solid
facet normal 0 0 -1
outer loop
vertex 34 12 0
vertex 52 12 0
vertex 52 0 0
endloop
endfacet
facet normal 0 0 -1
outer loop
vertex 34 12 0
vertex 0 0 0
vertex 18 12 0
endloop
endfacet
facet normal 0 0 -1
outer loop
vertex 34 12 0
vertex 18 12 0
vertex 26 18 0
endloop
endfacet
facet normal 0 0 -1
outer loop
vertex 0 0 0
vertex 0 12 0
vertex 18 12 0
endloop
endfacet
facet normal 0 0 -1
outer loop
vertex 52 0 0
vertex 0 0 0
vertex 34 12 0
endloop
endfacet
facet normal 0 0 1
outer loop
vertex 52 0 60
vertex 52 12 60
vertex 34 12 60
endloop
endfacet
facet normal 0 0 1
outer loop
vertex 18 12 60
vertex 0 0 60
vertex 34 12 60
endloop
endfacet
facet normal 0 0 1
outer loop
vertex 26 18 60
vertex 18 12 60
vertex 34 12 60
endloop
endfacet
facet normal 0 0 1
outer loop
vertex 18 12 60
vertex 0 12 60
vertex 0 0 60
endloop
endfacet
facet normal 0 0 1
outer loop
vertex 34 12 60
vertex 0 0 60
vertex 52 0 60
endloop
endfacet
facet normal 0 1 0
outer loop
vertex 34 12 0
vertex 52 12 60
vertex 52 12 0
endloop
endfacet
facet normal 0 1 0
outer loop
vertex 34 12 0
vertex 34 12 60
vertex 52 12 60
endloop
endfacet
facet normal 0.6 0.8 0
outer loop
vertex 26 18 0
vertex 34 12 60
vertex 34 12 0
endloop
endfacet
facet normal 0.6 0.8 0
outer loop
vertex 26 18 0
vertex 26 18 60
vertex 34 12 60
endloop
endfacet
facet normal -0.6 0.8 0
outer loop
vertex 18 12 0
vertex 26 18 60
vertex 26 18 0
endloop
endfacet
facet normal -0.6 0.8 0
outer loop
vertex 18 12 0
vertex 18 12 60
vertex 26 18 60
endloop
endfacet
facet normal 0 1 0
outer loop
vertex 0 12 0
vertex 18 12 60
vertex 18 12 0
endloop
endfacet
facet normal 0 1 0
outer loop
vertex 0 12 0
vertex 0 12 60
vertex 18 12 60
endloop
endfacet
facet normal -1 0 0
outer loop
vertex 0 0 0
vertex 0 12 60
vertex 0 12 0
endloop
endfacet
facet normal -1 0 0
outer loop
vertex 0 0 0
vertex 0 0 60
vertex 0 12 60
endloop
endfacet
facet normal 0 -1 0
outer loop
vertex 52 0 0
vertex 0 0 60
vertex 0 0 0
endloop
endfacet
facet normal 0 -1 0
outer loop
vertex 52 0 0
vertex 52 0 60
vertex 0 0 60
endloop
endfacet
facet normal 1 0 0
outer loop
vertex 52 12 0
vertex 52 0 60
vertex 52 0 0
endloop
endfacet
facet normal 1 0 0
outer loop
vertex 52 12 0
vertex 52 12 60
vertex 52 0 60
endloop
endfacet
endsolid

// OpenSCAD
$fn = 32;

// ----------------------------------------------------------------------
// V guide rail: vrib, 52 mm wide
// ----------------------------------------------------------------------

// --- parameters (mm) ---
rail_w = 52;              // rail width, X
base_t = 12;              // base plate thickness
v_depth = 6;              // V feature depth / height
v_half_w = 8;             // half width of the V at the base face
plate_t = 60;             // rail length, Z (the extrusion height)
fit_tol = 0.05;           // declared fit tolerance (prompt contract)
free_tol = 0.2;           // declared free tolerance (prompt contract)

profile = [[0, 0], [52, 0], [52, 12], [34, 12], [26, 18], [18, 12], [0, 12]];  // primary outline, 7 points, counter clockwise

// --- the one profile operation ---
linear_extrude(height = plate_t) polygon(points = profile);
